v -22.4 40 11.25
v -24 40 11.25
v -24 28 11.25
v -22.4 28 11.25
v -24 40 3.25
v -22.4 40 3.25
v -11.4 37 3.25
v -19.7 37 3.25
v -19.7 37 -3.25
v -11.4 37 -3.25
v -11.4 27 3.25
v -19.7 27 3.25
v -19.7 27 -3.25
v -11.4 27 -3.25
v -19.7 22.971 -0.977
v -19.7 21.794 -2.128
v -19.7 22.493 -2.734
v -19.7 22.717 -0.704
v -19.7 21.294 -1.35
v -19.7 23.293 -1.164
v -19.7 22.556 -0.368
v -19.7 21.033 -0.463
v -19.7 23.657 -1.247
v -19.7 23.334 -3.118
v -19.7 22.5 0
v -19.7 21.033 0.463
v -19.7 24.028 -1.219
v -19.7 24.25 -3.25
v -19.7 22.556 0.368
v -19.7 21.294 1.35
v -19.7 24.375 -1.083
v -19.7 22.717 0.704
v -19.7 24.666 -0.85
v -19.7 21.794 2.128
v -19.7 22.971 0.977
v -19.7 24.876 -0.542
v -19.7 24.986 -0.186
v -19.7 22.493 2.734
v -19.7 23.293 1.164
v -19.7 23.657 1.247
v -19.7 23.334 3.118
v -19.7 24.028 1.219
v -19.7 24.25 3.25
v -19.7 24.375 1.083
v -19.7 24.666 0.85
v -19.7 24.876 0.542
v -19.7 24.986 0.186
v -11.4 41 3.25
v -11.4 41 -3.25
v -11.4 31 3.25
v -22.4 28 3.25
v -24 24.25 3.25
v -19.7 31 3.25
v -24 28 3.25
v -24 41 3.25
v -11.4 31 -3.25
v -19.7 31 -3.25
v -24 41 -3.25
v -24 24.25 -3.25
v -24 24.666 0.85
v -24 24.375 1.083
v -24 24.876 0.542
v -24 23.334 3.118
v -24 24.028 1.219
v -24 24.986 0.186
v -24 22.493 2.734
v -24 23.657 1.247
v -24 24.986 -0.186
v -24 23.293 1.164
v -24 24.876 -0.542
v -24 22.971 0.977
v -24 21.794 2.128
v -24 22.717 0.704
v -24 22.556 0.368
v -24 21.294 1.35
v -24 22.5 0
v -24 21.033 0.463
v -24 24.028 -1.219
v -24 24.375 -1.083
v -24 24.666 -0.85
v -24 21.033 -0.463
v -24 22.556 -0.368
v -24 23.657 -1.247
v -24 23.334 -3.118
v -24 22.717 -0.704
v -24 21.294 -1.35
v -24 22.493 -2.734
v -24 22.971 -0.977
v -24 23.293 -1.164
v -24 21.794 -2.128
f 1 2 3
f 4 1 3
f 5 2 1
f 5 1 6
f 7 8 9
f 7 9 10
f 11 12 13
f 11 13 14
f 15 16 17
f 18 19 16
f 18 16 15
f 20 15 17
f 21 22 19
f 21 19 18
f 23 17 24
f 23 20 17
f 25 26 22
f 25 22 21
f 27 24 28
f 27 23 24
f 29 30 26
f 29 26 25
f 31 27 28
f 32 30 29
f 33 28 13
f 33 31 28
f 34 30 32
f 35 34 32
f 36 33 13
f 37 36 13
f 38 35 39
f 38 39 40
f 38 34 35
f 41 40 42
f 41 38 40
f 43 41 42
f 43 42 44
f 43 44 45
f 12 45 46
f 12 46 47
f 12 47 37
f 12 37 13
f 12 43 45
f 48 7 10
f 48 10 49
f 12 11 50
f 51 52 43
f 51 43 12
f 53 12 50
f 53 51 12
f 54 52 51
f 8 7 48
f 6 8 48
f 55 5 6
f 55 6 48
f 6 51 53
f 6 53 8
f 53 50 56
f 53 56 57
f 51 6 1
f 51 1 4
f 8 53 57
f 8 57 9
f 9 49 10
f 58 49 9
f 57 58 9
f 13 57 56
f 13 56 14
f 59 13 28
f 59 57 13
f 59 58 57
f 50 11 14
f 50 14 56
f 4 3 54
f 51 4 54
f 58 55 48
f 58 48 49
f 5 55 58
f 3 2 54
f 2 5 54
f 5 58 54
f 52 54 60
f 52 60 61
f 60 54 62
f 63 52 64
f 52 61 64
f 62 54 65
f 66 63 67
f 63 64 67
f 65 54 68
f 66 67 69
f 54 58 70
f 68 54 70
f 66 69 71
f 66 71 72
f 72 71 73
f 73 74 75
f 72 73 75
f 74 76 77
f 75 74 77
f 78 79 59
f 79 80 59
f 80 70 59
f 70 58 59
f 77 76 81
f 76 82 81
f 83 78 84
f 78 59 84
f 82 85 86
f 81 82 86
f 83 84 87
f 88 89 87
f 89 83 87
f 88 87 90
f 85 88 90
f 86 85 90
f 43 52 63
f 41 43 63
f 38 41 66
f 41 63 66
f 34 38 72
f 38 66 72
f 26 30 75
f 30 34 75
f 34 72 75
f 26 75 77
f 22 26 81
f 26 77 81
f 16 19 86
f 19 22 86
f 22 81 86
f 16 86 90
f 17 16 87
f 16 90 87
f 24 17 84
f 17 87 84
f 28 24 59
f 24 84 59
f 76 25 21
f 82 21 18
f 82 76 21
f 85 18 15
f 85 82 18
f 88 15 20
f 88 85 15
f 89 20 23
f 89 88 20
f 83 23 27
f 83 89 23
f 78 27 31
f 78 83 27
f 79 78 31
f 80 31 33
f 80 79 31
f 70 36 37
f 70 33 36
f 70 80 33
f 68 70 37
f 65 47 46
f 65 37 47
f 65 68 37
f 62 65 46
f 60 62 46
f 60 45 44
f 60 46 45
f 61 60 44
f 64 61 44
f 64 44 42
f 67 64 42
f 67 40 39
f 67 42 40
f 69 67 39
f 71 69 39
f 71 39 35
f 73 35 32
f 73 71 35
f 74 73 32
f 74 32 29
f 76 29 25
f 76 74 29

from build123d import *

# Parameters (mm, degrees)
SKETCH009_R               = 1.25
EXTRUDE006_DEPTH          = 1.6
SKETCH007_R               = 1.25
EXTRUDE004_DEPTH          = 11
EXTRUDE003_DEPTH          = 3.3
FUSION021_ROLL_ANGLE      = -90
FUSION021_PLACEMENT_ANGLE = -90


with BuildPart() as opticalsensorpcbonlyonetab:
    # Sketch009 → Extrude006 (new body)
    with BuildSketch(Plane.XY):
        with BuildLine():
            Line((-6, 0), (6, 0))
            Line((6, 0), (6, 8))
            Line((6, 8), (9.75, 8))
            ThreePointArc((9.75, 8), (13, 11.25), (9.75, 14.5))
            Line((-7, 14.5), (9.75, 14.5))
            Line((-7, 8), (-7, 14.5))
            Line((-6, 8), (-7, 8))
            Line((-6, 0), (-6, 8))
        make_face()
        with Locations((10.25, 11.25)):
            Circle(SKETCH009_R, mode=Mode.SUBTRACT)
    extrude(amount=EXTRUDE006_DEPTH)


with BuildPart() as opticalsensoronlyonetabtopview:
    # Sketch007 → Extrude004 (new body)
    with BuildSketch(Plane.XY):
        with BuildLine():
            Line((-7, 3.25), (9.75, 3.25))
            ThreePointArc((9.75, -3.25), (13, 0), (9.75, 3.25))
            Line((-7, -3.25), (9.75, -3.25))
            Line((-7, -3.25), (-7, 3.25))
        make_face()
        with Locations((10.25, 0)):
            Circle(SKETCH007_R, mode=Mode.SUBTRACT)
    extrude(amount=EXTRUDE004_DEPTH)


with BuildPart() as hourhomeswitch:
    # Sketch006 → Extrude003 (new body, symmetric)
    with BuildSketch(Plane.XZ):
        Polygon((-7, 0), (13, 0), (13, 2.7), (7, 2.7), (7, 11), (3, 11), (3, 2.7), (-3, 2.7), (-3, 11), (-7, 11), align=None)
    extrude(amount=EXTRUDE003_DEPTH, both=True)

    # Common: intersect OpticalSensorOnlyOneTabTopView
    add(opticalsensoronlyonetabtopview.part, mode=Mode.INTERSECT)


with BuildPart() as hourhomeswitch_1:
    # Common placement: moved
    add(hourhomeswitch.part.moved(Location((0, 11.25, 1.6))))

    # Fusion021: union OpticalSensorPcbOnlyOneTab
    add(opticalsensorpcbonlyonetab.part)


with BuildPart() as hourhomeswitch_2:
    # Fusion021 roll: moved
    add(hourhomeswitch_1.part.rotate(Axis((0, 0, 0), (1, 0, 0)), FUSION021_ROLL_ANGLE))


with BuildPart() as hourhomeswitch_3:
    # Fusion021 placement: moved
    add(hourhomeswitch_2.part.moved(Location((-24, 34, 11.25))).rotate(Axis((-24, 34, 11.25), (0, 0, 1)), FUSION021_PLACEMENT_ANGLE))


solid = hourhomeswitch_3.part
